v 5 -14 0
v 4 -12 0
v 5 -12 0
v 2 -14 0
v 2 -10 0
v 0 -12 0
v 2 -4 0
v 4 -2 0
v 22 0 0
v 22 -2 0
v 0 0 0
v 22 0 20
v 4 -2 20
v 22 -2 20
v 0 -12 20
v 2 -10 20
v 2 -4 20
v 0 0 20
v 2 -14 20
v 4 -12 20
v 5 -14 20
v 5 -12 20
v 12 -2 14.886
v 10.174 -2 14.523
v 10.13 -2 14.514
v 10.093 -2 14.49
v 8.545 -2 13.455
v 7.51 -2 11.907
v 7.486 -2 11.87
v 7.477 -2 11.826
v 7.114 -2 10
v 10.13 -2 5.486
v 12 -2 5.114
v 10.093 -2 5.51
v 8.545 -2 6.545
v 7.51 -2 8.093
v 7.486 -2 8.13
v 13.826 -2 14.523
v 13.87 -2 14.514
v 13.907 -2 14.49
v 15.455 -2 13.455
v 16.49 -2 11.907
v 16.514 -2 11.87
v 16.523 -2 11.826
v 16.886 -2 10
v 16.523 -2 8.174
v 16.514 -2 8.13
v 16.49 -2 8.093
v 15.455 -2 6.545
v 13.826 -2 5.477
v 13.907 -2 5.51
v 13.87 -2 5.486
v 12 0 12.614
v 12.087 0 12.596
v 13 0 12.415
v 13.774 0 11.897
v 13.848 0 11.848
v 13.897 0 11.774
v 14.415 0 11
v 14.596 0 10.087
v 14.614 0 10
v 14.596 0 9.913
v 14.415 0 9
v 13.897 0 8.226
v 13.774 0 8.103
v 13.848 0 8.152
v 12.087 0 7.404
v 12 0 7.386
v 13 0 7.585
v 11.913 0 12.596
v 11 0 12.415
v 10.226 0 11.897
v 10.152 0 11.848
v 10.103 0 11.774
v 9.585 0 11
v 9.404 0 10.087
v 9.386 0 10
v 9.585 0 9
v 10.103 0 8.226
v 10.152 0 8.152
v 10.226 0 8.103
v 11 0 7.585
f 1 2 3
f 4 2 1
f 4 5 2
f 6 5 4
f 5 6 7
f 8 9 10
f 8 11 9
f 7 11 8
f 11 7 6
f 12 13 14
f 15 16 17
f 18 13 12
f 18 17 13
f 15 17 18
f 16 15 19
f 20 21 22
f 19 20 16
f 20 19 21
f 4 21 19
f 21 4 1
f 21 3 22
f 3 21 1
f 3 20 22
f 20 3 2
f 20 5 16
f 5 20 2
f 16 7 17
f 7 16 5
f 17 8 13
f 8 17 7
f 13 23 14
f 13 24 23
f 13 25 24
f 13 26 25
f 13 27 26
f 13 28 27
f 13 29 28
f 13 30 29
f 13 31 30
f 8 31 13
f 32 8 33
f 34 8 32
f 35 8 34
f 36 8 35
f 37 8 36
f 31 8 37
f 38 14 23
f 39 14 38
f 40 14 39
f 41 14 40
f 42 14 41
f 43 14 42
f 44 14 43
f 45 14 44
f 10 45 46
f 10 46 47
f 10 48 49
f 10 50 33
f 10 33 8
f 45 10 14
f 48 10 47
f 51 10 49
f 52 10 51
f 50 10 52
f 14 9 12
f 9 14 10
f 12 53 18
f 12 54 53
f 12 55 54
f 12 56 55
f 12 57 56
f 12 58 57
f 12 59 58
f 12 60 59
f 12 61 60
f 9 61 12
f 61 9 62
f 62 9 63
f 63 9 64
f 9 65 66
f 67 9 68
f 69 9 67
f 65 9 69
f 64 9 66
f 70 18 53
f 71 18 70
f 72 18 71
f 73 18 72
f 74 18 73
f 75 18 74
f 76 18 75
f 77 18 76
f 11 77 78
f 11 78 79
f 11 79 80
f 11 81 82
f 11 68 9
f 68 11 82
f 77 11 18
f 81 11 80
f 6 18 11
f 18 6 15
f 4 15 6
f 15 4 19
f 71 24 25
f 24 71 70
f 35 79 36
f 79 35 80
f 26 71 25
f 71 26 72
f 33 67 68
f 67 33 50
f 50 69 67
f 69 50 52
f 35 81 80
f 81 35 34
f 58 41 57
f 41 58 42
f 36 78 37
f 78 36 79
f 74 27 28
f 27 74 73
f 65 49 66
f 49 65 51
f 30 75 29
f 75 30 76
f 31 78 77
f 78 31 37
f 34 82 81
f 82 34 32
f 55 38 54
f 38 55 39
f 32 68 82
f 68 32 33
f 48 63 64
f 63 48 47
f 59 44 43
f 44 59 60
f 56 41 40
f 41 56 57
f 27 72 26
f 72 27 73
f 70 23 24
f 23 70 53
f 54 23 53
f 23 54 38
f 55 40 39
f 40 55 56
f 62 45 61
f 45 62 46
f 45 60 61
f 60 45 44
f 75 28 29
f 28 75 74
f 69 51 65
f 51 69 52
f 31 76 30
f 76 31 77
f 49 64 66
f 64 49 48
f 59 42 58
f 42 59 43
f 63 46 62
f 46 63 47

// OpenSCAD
// Customizable Wall Bracket
// (c) 2013 Wouter Robers

// How thick is the thing you want to bracket?
ClampSize=10;

// Material thickness (thicker makes stronger, but less flexible).
Thickness=2;

// Height of the rim in the front of the bracket
RimHeight=3; 

// Corner bevel size (bigger bevel gives better strength)
Corner=2;


MakeBracket();

module MakeBracket(){
Width=20;
rotate([0,0,-90]) difference(){
linear_extrude(height = Width)
polygon([[0,0],[0,20+Thickness],[Thickness,20+Thickness],[Thickness,Thickness+Corner],[Thickness+Corner,Thickness],[Thickness+ClampSize-Corner,Thickness],[Thickness+ClampSize,Thickness+Corner],[Thickness+ClampSize,Thickness+RimHeight],[2*Thickness+ClampSize,Thickness+RimHeight],[2*Thickness+ClampSize,Corner],[2*Thickness+ClampSize-Corner,0]]);

# translate([-0.1,10+Thickness,Width/2]) rotate([0,90,0]) cylinder(r1=2.5,r2=5,h=Thickness+0.2);
}
}
